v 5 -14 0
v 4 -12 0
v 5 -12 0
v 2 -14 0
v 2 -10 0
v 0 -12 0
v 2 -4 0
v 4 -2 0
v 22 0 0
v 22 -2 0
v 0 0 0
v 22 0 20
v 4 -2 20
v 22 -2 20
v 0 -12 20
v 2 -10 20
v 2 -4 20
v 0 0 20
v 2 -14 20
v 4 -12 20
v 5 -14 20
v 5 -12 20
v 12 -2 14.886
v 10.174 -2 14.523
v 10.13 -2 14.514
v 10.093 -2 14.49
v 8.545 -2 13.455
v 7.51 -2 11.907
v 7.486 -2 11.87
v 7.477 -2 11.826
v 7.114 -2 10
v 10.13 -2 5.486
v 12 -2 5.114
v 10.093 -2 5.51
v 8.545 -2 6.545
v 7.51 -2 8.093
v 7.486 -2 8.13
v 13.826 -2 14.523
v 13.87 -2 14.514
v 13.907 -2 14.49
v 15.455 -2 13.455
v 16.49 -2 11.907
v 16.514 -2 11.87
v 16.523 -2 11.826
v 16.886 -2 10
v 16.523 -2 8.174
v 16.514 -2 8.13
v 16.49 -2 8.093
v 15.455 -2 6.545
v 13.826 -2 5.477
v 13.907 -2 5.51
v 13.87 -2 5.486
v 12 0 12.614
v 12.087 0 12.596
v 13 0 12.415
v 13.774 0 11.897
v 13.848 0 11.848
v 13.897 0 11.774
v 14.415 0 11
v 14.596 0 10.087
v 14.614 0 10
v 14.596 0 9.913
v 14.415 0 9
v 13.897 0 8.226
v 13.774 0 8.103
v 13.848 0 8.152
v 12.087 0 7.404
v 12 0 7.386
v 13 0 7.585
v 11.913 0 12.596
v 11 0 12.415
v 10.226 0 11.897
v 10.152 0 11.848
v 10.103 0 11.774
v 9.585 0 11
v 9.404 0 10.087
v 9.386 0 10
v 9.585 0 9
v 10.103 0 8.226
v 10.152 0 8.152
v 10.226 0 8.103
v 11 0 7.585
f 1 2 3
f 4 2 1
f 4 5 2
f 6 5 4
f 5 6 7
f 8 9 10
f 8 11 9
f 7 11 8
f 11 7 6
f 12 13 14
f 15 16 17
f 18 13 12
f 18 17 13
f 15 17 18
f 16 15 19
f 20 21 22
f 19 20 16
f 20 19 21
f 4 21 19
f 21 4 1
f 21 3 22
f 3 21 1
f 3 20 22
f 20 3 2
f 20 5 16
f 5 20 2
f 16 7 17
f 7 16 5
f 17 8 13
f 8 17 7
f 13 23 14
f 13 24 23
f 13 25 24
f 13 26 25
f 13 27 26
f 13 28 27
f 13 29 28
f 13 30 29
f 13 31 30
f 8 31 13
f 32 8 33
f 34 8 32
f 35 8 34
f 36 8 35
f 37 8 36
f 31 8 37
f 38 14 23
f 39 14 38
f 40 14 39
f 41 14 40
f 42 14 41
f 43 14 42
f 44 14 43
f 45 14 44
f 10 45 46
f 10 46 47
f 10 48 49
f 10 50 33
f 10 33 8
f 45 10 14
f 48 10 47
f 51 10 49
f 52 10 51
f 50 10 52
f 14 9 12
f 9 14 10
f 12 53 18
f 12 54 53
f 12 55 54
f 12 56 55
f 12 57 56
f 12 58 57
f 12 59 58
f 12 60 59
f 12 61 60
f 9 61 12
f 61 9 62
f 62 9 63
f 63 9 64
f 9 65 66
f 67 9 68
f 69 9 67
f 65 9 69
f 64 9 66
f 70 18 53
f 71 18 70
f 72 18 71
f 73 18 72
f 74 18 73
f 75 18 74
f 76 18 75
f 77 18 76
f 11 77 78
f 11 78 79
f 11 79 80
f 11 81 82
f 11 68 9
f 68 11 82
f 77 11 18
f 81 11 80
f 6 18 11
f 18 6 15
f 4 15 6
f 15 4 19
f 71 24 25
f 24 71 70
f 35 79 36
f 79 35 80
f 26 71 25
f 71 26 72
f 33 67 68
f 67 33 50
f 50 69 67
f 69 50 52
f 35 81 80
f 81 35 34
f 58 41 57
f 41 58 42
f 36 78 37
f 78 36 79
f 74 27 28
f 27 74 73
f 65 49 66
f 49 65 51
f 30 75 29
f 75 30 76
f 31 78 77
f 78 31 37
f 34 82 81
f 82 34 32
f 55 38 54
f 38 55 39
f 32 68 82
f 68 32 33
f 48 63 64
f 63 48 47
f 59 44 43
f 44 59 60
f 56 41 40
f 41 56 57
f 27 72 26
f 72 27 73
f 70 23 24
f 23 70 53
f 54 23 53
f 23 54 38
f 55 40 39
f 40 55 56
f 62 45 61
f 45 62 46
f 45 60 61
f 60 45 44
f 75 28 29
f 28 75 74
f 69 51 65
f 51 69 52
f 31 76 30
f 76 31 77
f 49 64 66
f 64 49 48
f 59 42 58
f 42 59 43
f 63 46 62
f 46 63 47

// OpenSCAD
// Customizable Wall Bracket
// (c) 2013 Wouter Robers

// How thick is the thing you want to bracket?
ClampSize=10;

// Material thickness (thicker makes stronger, but less flexible).
Thickness=2;

// Height of the rim in the front of the bracket
RimHeight=3; 

// Corner bevel size (bigger bevel gives better strength)
Corner=2;


MakeBracket();

module MakeBracket(){
Width=20;
rotate([0,0,-90]) difference(){
linear_extrude(height = Width)
polygon([[0,0],[0,20+Thickness],[Thickness,20+Thickness],[Thickness,Thickness+Corner],[Thickness+Corner,Thickness],[Thickness+ClampSize-Corner,Thickness],[Thickness+ClampSize,Thickness+Corner],[Thickness+ClampSize,Thickness+RimHeight],[2*Thickness+ClampSize,Thickness+RimHeight],[2*Thickness+ClampSize,Corner],[2*Thickness+ClampSize-Corner,0]]);

# translate([-0.1,10+Thickness,Width/2]) rotate([0,90,0]) cylinder(r1=2.5,r2=5,h=Thickness+0.2);
}
}
